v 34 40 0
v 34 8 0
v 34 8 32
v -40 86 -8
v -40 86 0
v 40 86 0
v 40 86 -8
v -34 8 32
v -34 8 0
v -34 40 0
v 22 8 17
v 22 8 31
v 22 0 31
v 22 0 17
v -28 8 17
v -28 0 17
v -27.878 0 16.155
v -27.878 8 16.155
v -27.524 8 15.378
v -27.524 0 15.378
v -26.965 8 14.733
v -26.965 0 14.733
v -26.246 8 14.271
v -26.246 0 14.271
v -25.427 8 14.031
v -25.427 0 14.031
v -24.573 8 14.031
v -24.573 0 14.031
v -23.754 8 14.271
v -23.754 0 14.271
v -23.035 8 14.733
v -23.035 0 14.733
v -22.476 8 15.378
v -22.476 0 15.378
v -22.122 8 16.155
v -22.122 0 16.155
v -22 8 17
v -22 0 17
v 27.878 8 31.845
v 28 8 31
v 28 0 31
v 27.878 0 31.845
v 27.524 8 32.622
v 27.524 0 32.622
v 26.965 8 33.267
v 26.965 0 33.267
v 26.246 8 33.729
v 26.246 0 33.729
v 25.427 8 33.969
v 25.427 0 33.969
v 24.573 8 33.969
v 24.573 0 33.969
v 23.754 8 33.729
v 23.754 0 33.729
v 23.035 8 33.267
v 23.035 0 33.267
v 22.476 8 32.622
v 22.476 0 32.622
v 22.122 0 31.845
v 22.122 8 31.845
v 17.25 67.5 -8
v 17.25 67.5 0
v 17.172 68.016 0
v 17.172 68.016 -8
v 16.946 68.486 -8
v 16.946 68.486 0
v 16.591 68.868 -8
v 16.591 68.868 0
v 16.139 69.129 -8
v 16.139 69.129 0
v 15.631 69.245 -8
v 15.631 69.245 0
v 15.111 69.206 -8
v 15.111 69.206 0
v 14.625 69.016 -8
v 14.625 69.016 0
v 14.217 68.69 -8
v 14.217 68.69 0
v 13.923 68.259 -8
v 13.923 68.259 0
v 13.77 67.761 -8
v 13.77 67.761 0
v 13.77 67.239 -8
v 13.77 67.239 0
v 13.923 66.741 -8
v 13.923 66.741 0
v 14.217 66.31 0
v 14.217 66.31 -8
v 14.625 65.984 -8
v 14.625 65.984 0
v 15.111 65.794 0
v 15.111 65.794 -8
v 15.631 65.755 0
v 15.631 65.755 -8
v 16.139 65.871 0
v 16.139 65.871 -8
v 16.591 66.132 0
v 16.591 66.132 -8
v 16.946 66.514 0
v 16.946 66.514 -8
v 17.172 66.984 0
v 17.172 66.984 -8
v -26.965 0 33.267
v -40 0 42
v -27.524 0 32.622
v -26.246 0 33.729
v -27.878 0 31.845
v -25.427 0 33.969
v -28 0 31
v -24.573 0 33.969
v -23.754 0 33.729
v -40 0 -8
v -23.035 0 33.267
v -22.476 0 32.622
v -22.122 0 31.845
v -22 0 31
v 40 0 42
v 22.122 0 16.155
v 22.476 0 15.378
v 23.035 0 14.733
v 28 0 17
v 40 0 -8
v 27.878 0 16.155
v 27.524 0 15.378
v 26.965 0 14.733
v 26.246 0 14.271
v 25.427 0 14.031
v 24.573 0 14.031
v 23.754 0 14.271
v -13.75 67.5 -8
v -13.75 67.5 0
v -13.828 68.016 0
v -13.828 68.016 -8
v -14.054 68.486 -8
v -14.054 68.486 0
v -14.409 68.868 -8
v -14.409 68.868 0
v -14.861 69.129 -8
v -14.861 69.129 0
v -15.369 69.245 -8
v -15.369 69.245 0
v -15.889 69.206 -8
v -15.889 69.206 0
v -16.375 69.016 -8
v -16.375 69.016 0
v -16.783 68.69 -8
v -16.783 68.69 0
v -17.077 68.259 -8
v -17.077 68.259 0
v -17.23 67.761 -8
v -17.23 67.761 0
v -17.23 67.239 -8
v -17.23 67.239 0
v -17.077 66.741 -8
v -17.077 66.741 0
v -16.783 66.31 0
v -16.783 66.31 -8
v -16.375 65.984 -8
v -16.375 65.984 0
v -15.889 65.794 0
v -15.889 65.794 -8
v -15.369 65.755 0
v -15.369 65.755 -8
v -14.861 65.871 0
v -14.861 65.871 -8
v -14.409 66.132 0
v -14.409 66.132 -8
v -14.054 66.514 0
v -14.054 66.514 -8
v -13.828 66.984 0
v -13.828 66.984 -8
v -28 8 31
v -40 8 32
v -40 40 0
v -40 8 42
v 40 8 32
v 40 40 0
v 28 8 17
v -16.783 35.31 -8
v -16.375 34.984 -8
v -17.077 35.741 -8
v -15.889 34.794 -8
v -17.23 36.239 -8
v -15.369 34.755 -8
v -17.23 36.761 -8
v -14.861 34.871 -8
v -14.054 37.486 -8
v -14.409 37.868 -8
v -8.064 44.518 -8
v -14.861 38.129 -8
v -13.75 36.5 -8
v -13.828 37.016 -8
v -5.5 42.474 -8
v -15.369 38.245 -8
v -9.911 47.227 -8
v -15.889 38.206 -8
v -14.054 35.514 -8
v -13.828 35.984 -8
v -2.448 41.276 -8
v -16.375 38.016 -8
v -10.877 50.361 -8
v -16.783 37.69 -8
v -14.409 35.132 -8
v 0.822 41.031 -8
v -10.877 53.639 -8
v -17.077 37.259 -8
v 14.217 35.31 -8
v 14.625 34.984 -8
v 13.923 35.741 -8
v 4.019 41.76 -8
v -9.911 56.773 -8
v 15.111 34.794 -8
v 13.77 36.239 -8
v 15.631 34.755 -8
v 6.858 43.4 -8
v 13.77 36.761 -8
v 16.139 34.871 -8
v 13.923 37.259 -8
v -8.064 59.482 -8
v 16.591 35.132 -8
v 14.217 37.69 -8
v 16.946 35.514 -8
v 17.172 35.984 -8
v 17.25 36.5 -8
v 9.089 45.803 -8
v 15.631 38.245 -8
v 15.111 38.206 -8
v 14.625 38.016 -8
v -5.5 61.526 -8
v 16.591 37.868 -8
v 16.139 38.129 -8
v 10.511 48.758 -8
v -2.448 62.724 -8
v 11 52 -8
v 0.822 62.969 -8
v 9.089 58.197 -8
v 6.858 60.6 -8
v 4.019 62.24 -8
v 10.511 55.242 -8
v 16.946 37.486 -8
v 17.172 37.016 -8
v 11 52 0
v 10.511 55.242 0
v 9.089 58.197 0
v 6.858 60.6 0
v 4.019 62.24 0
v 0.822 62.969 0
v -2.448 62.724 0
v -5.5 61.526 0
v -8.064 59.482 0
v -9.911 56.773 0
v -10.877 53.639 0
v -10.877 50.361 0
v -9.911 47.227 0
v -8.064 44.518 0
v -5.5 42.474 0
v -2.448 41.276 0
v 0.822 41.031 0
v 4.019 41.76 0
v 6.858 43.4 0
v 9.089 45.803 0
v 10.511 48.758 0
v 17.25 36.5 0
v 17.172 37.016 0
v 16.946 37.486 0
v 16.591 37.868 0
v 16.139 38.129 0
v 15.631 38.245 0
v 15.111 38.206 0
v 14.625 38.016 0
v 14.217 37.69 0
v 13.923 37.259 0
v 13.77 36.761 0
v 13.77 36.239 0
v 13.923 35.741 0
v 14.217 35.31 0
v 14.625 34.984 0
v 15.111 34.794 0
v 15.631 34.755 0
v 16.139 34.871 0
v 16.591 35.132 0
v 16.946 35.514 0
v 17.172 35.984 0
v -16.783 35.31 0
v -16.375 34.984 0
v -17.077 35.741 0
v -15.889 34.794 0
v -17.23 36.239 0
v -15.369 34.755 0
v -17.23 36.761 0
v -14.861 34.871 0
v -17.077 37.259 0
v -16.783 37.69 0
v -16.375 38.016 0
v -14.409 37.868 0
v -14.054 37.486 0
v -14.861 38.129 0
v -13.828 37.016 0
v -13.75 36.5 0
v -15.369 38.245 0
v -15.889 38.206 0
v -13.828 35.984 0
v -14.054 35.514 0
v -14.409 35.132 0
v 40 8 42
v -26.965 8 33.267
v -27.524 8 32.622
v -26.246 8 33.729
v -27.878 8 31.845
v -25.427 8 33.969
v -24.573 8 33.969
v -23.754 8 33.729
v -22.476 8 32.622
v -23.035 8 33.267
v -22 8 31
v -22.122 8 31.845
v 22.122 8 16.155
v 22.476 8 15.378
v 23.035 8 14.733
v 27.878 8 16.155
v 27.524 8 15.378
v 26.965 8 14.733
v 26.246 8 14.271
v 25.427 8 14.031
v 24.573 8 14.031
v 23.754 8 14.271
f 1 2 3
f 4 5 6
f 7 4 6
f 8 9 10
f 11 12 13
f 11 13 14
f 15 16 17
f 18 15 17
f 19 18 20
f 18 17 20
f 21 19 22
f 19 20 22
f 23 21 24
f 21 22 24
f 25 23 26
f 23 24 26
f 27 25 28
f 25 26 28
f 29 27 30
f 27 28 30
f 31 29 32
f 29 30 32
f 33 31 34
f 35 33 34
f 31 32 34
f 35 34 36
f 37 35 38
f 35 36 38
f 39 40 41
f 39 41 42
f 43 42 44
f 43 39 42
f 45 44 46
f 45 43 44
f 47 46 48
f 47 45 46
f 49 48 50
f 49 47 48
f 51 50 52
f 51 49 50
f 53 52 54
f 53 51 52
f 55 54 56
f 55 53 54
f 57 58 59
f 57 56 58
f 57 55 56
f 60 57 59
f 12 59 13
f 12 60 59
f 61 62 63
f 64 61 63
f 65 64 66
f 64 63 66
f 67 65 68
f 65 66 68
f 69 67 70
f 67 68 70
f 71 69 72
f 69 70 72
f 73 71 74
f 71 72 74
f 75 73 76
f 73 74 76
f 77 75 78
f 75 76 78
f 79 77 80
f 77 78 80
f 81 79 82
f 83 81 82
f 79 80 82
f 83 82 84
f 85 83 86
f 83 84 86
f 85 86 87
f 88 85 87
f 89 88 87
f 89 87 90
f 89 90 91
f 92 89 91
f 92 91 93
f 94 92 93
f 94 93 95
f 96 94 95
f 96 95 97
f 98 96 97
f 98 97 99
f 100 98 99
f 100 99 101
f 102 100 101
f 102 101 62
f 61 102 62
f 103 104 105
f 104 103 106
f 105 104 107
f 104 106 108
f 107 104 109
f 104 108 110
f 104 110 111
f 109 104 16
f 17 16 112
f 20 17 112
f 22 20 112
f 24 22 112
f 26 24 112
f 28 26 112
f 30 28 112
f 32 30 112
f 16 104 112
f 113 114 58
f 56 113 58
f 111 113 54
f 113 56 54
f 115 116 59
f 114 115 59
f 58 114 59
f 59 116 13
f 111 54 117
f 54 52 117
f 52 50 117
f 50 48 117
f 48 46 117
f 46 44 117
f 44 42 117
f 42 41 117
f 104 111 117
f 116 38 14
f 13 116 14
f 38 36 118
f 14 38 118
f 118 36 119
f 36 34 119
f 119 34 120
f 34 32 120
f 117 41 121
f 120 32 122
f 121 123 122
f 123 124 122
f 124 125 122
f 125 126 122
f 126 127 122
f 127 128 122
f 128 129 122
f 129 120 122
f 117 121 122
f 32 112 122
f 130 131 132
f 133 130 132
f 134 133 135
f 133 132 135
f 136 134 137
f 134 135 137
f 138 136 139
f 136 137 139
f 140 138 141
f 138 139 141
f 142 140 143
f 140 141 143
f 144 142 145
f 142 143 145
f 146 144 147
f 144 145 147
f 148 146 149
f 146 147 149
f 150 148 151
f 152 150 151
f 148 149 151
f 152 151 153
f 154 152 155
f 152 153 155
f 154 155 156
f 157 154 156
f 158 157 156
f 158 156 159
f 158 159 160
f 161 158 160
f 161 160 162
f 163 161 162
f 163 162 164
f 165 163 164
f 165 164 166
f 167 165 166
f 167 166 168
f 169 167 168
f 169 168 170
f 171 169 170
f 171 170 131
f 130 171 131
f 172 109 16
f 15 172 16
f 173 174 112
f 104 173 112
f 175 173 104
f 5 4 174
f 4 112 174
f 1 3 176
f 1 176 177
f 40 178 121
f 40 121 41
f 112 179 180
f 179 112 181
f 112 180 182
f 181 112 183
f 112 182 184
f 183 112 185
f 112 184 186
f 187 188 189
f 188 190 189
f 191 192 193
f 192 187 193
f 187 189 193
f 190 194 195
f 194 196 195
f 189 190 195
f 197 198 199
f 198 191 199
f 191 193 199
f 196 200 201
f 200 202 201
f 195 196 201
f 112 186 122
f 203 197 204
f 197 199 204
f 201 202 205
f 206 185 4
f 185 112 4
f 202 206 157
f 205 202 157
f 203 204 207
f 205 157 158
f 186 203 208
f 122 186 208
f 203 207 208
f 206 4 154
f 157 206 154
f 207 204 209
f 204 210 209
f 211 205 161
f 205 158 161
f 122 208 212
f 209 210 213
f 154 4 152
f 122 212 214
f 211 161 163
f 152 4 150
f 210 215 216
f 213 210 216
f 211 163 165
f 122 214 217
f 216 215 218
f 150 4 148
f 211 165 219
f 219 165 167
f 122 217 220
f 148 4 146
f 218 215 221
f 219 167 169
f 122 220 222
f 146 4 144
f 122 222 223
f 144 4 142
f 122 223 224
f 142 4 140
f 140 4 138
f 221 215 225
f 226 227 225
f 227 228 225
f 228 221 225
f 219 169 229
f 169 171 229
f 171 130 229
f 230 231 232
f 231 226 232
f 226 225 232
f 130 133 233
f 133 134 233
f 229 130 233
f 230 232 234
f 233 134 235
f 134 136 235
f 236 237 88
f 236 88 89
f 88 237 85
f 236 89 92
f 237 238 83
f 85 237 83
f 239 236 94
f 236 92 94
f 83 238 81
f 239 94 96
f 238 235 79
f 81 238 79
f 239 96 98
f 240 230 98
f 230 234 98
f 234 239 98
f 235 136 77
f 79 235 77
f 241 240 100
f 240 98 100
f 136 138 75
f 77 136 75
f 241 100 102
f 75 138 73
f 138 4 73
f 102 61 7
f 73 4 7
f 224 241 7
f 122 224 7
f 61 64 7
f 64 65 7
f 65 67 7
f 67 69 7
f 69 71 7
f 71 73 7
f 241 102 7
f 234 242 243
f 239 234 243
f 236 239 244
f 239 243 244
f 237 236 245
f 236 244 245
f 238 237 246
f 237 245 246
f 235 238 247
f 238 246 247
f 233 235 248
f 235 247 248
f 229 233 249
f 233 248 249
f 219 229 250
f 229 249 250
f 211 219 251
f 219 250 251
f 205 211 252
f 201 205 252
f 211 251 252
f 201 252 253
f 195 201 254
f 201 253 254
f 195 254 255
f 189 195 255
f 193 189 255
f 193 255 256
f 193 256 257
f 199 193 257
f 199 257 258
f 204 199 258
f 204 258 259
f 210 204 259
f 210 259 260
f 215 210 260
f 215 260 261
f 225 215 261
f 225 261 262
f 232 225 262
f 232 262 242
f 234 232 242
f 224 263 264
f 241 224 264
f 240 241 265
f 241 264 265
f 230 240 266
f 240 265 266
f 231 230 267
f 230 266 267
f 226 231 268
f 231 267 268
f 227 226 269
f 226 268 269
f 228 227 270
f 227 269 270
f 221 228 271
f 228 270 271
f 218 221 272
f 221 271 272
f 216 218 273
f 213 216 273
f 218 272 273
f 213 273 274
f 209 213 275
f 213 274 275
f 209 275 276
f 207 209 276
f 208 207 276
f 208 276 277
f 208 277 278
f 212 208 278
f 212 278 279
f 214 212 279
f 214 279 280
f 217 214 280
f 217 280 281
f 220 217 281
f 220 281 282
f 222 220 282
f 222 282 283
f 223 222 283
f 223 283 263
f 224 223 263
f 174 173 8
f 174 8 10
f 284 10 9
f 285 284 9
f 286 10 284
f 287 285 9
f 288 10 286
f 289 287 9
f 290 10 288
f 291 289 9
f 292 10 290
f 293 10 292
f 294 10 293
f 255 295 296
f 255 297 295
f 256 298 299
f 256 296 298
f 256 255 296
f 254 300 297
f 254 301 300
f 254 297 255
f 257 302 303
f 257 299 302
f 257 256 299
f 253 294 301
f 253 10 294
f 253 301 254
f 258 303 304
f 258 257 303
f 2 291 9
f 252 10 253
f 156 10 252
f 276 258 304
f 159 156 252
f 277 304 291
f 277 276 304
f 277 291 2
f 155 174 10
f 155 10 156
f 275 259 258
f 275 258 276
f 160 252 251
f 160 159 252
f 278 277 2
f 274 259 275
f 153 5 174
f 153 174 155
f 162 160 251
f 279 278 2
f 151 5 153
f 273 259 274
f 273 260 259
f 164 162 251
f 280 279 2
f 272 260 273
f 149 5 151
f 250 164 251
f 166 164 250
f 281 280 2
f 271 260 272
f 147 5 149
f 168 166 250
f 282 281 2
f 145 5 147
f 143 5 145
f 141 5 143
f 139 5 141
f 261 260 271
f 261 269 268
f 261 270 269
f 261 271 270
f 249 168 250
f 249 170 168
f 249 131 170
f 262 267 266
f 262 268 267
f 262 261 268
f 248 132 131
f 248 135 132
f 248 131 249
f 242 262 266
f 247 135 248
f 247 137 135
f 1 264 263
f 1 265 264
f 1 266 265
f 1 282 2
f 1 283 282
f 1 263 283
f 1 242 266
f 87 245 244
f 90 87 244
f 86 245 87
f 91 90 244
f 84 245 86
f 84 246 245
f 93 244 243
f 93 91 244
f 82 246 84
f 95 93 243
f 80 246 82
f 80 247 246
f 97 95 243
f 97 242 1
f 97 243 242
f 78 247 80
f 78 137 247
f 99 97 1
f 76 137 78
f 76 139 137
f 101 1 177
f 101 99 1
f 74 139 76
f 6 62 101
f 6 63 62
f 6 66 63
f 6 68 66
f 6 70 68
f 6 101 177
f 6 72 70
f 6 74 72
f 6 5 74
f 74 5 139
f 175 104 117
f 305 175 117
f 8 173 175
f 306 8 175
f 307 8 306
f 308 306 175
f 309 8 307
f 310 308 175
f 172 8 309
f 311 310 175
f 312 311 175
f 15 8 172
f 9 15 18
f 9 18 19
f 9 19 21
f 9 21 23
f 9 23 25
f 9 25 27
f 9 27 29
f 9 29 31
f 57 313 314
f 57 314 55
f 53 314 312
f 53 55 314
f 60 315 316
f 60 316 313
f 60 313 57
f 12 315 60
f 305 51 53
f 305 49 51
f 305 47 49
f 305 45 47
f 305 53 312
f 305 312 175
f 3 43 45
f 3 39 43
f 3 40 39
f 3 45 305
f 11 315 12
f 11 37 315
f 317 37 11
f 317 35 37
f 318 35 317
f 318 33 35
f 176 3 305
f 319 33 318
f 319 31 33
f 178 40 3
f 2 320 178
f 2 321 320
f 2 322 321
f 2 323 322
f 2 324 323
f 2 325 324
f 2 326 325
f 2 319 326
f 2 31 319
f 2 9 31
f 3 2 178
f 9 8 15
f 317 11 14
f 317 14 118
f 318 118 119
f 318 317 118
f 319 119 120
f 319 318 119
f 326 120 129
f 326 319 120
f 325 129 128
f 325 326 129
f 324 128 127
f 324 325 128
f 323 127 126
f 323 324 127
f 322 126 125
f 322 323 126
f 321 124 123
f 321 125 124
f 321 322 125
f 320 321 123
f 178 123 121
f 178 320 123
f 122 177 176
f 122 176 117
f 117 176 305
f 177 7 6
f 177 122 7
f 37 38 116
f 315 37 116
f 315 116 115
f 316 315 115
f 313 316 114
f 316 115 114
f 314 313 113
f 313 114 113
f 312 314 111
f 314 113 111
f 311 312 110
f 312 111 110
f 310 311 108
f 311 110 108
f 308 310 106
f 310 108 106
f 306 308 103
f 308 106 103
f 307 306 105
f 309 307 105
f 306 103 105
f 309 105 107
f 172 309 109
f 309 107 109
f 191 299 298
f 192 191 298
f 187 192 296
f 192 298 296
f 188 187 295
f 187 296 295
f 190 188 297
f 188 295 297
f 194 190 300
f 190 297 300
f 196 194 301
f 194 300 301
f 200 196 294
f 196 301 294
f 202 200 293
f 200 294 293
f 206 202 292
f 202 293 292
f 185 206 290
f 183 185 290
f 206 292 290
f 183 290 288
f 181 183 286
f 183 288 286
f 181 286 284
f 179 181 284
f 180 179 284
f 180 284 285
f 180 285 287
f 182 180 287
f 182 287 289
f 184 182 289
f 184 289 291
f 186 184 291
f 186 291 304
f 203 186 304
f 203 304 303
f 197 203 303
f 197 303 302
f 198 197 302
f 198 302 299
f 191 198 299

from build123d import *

# Parameters (mm, degrees)
SKETCH_3_W          = 80
SKETCH_3_H          = 50
EXTRUDE_3_DEPTH     = 8
SKETCH_4_W          = 80
SKETCH_4_H          = 86
EXTRUDE_4_DEPTH     = 8
SKETCH_7_W          = 100
SKETCH_7_H          = 18
CUT_EXTRUDE_1_DEPTH = 95
CUT_EXTRUDE_2_DEPTH = 87
SKETCH_9_R          = 11
CUT_EXTRUDE_3_DEPTH = 104.730419839
SKETCH_10_R         = 1.75
CUT_EXTRUDE_4_DEPTH = 104.730419839
EXTRUDE_7_DEPTH     = 6
EXTRUDE_8_DEPTH     = 6


with BuildPart() as part:
    # 草图3 → 凸台-拉伸3 (new body)
    with BuildSketch(Plane(origin=(0, 0, 0), x_dir=(1, 0, 0), z_dir=(0, 1, 0))):
        with Locations((0, -17)):
            Rectangle(SKETCH_3_W, SKETCH_3_H)
    extrude(amount=EXTRUDE_3_DEPTH)

    # 草图4 → 凸台-拉伸4 (add)
    with BuildSketch(Plane.XY):
        with Locations((0, 51)):
            Rectangle(SKETCH_4_W, SKETCH_4_H)
    extrude(amount=-EXTRUDE_4_DEPTH)

    # 草图7 → 切除-拉伸1 (cut, symmetric)
    with BuildSketch(Plane.XY):
        with Locations((0, 95)):
            Rectangle(SKETCH_7_W, SKETCH_7_H)
    extrude(amount=CUT_EXTRUDE_1_DEPTH, both=True, mode=Mode.SUBTRACT)

    # 草图8 → 切除-拉伸2 (cut, symmetric)
    with BuildSketch(Plane(origin=(0, 8, 0), x_dir=(1, 0, 0), z_dir=(0, 1, 0))):
        with BuildLine():
            Line((-22, -17), (-22, -31))
            ThreePointArc((-22, -31), (-25, -34), (-28, -31))
            Line((-28, -31), (-28, -17))
            ThreePointArc((-28, -17), (-25, -14), (-22, -17))
        make_face()
        with BuildLine():
            Line((28, -17), (28, -31))
            ThreePointArc((28, -31), (25, -34), (22, -31))
            Line((22, -31), (22, -17))
            ThreePointArc((22, -17), (25, -14), (28, -17))
        make_face()
    extrude(amount=CUT_EXTRUDE_2_DEPTH, both=True, mode=Mode.SUBTRACT)

    # 草图9 → 切除-拉伸3 (cut, through all)
    with BuildSketch(Plane.XY):
        with Locations((0, 52)):
            Circle(SKETCH_9_R)
    extrude(amount=-CUT_EXTRUDE_3_DEPTH, mode=Mode.SUBTRACT)

    # 草图10 → 切除-拉伸4 (cut, through all)
    with BuildSketch(Plane.XY):
        with Locations((-15.5, 67.5)):
            Circle(SKETCH_10_R)
        with Locations((15.5, 67.5)):
            Circle(SKETCH_10_R)
        with Locations((-15.5, 36.5)):
            Circle(SKETCH_10_R)
        with Locations((15.5, 36.5)):
            Circle(SKETCH_10_R)
    extrude(amount=-CUT_EXTRUDE_4_DEPTH, mode=Mode.SUBTRACT)

    # 草图11 → 凸台-拉伸7 (add)
    with BuildSketch(Plane(origin=(-40, 0, 0), x_dir=(0, 0, -1), z_dir=(1, 0, 0))):
        Polygon((0, 8), (-32, 8), (0, 40), align=None)
    extrude(amount=EXTRUDE_7_DEPTH)

    # 草图12 → 凸台-拉伸8 (add)
    with BuildSketch(Plane(origin=(34, 0, 0), x_dir=(0, 0, -1), z_dir=(1, 0, 0))):
        Polygon((0, 8), (-32, 8), (0, 40), align=None)
    extrude(amount=EXTRUDE_8_DEPTH)


solid = part.part
